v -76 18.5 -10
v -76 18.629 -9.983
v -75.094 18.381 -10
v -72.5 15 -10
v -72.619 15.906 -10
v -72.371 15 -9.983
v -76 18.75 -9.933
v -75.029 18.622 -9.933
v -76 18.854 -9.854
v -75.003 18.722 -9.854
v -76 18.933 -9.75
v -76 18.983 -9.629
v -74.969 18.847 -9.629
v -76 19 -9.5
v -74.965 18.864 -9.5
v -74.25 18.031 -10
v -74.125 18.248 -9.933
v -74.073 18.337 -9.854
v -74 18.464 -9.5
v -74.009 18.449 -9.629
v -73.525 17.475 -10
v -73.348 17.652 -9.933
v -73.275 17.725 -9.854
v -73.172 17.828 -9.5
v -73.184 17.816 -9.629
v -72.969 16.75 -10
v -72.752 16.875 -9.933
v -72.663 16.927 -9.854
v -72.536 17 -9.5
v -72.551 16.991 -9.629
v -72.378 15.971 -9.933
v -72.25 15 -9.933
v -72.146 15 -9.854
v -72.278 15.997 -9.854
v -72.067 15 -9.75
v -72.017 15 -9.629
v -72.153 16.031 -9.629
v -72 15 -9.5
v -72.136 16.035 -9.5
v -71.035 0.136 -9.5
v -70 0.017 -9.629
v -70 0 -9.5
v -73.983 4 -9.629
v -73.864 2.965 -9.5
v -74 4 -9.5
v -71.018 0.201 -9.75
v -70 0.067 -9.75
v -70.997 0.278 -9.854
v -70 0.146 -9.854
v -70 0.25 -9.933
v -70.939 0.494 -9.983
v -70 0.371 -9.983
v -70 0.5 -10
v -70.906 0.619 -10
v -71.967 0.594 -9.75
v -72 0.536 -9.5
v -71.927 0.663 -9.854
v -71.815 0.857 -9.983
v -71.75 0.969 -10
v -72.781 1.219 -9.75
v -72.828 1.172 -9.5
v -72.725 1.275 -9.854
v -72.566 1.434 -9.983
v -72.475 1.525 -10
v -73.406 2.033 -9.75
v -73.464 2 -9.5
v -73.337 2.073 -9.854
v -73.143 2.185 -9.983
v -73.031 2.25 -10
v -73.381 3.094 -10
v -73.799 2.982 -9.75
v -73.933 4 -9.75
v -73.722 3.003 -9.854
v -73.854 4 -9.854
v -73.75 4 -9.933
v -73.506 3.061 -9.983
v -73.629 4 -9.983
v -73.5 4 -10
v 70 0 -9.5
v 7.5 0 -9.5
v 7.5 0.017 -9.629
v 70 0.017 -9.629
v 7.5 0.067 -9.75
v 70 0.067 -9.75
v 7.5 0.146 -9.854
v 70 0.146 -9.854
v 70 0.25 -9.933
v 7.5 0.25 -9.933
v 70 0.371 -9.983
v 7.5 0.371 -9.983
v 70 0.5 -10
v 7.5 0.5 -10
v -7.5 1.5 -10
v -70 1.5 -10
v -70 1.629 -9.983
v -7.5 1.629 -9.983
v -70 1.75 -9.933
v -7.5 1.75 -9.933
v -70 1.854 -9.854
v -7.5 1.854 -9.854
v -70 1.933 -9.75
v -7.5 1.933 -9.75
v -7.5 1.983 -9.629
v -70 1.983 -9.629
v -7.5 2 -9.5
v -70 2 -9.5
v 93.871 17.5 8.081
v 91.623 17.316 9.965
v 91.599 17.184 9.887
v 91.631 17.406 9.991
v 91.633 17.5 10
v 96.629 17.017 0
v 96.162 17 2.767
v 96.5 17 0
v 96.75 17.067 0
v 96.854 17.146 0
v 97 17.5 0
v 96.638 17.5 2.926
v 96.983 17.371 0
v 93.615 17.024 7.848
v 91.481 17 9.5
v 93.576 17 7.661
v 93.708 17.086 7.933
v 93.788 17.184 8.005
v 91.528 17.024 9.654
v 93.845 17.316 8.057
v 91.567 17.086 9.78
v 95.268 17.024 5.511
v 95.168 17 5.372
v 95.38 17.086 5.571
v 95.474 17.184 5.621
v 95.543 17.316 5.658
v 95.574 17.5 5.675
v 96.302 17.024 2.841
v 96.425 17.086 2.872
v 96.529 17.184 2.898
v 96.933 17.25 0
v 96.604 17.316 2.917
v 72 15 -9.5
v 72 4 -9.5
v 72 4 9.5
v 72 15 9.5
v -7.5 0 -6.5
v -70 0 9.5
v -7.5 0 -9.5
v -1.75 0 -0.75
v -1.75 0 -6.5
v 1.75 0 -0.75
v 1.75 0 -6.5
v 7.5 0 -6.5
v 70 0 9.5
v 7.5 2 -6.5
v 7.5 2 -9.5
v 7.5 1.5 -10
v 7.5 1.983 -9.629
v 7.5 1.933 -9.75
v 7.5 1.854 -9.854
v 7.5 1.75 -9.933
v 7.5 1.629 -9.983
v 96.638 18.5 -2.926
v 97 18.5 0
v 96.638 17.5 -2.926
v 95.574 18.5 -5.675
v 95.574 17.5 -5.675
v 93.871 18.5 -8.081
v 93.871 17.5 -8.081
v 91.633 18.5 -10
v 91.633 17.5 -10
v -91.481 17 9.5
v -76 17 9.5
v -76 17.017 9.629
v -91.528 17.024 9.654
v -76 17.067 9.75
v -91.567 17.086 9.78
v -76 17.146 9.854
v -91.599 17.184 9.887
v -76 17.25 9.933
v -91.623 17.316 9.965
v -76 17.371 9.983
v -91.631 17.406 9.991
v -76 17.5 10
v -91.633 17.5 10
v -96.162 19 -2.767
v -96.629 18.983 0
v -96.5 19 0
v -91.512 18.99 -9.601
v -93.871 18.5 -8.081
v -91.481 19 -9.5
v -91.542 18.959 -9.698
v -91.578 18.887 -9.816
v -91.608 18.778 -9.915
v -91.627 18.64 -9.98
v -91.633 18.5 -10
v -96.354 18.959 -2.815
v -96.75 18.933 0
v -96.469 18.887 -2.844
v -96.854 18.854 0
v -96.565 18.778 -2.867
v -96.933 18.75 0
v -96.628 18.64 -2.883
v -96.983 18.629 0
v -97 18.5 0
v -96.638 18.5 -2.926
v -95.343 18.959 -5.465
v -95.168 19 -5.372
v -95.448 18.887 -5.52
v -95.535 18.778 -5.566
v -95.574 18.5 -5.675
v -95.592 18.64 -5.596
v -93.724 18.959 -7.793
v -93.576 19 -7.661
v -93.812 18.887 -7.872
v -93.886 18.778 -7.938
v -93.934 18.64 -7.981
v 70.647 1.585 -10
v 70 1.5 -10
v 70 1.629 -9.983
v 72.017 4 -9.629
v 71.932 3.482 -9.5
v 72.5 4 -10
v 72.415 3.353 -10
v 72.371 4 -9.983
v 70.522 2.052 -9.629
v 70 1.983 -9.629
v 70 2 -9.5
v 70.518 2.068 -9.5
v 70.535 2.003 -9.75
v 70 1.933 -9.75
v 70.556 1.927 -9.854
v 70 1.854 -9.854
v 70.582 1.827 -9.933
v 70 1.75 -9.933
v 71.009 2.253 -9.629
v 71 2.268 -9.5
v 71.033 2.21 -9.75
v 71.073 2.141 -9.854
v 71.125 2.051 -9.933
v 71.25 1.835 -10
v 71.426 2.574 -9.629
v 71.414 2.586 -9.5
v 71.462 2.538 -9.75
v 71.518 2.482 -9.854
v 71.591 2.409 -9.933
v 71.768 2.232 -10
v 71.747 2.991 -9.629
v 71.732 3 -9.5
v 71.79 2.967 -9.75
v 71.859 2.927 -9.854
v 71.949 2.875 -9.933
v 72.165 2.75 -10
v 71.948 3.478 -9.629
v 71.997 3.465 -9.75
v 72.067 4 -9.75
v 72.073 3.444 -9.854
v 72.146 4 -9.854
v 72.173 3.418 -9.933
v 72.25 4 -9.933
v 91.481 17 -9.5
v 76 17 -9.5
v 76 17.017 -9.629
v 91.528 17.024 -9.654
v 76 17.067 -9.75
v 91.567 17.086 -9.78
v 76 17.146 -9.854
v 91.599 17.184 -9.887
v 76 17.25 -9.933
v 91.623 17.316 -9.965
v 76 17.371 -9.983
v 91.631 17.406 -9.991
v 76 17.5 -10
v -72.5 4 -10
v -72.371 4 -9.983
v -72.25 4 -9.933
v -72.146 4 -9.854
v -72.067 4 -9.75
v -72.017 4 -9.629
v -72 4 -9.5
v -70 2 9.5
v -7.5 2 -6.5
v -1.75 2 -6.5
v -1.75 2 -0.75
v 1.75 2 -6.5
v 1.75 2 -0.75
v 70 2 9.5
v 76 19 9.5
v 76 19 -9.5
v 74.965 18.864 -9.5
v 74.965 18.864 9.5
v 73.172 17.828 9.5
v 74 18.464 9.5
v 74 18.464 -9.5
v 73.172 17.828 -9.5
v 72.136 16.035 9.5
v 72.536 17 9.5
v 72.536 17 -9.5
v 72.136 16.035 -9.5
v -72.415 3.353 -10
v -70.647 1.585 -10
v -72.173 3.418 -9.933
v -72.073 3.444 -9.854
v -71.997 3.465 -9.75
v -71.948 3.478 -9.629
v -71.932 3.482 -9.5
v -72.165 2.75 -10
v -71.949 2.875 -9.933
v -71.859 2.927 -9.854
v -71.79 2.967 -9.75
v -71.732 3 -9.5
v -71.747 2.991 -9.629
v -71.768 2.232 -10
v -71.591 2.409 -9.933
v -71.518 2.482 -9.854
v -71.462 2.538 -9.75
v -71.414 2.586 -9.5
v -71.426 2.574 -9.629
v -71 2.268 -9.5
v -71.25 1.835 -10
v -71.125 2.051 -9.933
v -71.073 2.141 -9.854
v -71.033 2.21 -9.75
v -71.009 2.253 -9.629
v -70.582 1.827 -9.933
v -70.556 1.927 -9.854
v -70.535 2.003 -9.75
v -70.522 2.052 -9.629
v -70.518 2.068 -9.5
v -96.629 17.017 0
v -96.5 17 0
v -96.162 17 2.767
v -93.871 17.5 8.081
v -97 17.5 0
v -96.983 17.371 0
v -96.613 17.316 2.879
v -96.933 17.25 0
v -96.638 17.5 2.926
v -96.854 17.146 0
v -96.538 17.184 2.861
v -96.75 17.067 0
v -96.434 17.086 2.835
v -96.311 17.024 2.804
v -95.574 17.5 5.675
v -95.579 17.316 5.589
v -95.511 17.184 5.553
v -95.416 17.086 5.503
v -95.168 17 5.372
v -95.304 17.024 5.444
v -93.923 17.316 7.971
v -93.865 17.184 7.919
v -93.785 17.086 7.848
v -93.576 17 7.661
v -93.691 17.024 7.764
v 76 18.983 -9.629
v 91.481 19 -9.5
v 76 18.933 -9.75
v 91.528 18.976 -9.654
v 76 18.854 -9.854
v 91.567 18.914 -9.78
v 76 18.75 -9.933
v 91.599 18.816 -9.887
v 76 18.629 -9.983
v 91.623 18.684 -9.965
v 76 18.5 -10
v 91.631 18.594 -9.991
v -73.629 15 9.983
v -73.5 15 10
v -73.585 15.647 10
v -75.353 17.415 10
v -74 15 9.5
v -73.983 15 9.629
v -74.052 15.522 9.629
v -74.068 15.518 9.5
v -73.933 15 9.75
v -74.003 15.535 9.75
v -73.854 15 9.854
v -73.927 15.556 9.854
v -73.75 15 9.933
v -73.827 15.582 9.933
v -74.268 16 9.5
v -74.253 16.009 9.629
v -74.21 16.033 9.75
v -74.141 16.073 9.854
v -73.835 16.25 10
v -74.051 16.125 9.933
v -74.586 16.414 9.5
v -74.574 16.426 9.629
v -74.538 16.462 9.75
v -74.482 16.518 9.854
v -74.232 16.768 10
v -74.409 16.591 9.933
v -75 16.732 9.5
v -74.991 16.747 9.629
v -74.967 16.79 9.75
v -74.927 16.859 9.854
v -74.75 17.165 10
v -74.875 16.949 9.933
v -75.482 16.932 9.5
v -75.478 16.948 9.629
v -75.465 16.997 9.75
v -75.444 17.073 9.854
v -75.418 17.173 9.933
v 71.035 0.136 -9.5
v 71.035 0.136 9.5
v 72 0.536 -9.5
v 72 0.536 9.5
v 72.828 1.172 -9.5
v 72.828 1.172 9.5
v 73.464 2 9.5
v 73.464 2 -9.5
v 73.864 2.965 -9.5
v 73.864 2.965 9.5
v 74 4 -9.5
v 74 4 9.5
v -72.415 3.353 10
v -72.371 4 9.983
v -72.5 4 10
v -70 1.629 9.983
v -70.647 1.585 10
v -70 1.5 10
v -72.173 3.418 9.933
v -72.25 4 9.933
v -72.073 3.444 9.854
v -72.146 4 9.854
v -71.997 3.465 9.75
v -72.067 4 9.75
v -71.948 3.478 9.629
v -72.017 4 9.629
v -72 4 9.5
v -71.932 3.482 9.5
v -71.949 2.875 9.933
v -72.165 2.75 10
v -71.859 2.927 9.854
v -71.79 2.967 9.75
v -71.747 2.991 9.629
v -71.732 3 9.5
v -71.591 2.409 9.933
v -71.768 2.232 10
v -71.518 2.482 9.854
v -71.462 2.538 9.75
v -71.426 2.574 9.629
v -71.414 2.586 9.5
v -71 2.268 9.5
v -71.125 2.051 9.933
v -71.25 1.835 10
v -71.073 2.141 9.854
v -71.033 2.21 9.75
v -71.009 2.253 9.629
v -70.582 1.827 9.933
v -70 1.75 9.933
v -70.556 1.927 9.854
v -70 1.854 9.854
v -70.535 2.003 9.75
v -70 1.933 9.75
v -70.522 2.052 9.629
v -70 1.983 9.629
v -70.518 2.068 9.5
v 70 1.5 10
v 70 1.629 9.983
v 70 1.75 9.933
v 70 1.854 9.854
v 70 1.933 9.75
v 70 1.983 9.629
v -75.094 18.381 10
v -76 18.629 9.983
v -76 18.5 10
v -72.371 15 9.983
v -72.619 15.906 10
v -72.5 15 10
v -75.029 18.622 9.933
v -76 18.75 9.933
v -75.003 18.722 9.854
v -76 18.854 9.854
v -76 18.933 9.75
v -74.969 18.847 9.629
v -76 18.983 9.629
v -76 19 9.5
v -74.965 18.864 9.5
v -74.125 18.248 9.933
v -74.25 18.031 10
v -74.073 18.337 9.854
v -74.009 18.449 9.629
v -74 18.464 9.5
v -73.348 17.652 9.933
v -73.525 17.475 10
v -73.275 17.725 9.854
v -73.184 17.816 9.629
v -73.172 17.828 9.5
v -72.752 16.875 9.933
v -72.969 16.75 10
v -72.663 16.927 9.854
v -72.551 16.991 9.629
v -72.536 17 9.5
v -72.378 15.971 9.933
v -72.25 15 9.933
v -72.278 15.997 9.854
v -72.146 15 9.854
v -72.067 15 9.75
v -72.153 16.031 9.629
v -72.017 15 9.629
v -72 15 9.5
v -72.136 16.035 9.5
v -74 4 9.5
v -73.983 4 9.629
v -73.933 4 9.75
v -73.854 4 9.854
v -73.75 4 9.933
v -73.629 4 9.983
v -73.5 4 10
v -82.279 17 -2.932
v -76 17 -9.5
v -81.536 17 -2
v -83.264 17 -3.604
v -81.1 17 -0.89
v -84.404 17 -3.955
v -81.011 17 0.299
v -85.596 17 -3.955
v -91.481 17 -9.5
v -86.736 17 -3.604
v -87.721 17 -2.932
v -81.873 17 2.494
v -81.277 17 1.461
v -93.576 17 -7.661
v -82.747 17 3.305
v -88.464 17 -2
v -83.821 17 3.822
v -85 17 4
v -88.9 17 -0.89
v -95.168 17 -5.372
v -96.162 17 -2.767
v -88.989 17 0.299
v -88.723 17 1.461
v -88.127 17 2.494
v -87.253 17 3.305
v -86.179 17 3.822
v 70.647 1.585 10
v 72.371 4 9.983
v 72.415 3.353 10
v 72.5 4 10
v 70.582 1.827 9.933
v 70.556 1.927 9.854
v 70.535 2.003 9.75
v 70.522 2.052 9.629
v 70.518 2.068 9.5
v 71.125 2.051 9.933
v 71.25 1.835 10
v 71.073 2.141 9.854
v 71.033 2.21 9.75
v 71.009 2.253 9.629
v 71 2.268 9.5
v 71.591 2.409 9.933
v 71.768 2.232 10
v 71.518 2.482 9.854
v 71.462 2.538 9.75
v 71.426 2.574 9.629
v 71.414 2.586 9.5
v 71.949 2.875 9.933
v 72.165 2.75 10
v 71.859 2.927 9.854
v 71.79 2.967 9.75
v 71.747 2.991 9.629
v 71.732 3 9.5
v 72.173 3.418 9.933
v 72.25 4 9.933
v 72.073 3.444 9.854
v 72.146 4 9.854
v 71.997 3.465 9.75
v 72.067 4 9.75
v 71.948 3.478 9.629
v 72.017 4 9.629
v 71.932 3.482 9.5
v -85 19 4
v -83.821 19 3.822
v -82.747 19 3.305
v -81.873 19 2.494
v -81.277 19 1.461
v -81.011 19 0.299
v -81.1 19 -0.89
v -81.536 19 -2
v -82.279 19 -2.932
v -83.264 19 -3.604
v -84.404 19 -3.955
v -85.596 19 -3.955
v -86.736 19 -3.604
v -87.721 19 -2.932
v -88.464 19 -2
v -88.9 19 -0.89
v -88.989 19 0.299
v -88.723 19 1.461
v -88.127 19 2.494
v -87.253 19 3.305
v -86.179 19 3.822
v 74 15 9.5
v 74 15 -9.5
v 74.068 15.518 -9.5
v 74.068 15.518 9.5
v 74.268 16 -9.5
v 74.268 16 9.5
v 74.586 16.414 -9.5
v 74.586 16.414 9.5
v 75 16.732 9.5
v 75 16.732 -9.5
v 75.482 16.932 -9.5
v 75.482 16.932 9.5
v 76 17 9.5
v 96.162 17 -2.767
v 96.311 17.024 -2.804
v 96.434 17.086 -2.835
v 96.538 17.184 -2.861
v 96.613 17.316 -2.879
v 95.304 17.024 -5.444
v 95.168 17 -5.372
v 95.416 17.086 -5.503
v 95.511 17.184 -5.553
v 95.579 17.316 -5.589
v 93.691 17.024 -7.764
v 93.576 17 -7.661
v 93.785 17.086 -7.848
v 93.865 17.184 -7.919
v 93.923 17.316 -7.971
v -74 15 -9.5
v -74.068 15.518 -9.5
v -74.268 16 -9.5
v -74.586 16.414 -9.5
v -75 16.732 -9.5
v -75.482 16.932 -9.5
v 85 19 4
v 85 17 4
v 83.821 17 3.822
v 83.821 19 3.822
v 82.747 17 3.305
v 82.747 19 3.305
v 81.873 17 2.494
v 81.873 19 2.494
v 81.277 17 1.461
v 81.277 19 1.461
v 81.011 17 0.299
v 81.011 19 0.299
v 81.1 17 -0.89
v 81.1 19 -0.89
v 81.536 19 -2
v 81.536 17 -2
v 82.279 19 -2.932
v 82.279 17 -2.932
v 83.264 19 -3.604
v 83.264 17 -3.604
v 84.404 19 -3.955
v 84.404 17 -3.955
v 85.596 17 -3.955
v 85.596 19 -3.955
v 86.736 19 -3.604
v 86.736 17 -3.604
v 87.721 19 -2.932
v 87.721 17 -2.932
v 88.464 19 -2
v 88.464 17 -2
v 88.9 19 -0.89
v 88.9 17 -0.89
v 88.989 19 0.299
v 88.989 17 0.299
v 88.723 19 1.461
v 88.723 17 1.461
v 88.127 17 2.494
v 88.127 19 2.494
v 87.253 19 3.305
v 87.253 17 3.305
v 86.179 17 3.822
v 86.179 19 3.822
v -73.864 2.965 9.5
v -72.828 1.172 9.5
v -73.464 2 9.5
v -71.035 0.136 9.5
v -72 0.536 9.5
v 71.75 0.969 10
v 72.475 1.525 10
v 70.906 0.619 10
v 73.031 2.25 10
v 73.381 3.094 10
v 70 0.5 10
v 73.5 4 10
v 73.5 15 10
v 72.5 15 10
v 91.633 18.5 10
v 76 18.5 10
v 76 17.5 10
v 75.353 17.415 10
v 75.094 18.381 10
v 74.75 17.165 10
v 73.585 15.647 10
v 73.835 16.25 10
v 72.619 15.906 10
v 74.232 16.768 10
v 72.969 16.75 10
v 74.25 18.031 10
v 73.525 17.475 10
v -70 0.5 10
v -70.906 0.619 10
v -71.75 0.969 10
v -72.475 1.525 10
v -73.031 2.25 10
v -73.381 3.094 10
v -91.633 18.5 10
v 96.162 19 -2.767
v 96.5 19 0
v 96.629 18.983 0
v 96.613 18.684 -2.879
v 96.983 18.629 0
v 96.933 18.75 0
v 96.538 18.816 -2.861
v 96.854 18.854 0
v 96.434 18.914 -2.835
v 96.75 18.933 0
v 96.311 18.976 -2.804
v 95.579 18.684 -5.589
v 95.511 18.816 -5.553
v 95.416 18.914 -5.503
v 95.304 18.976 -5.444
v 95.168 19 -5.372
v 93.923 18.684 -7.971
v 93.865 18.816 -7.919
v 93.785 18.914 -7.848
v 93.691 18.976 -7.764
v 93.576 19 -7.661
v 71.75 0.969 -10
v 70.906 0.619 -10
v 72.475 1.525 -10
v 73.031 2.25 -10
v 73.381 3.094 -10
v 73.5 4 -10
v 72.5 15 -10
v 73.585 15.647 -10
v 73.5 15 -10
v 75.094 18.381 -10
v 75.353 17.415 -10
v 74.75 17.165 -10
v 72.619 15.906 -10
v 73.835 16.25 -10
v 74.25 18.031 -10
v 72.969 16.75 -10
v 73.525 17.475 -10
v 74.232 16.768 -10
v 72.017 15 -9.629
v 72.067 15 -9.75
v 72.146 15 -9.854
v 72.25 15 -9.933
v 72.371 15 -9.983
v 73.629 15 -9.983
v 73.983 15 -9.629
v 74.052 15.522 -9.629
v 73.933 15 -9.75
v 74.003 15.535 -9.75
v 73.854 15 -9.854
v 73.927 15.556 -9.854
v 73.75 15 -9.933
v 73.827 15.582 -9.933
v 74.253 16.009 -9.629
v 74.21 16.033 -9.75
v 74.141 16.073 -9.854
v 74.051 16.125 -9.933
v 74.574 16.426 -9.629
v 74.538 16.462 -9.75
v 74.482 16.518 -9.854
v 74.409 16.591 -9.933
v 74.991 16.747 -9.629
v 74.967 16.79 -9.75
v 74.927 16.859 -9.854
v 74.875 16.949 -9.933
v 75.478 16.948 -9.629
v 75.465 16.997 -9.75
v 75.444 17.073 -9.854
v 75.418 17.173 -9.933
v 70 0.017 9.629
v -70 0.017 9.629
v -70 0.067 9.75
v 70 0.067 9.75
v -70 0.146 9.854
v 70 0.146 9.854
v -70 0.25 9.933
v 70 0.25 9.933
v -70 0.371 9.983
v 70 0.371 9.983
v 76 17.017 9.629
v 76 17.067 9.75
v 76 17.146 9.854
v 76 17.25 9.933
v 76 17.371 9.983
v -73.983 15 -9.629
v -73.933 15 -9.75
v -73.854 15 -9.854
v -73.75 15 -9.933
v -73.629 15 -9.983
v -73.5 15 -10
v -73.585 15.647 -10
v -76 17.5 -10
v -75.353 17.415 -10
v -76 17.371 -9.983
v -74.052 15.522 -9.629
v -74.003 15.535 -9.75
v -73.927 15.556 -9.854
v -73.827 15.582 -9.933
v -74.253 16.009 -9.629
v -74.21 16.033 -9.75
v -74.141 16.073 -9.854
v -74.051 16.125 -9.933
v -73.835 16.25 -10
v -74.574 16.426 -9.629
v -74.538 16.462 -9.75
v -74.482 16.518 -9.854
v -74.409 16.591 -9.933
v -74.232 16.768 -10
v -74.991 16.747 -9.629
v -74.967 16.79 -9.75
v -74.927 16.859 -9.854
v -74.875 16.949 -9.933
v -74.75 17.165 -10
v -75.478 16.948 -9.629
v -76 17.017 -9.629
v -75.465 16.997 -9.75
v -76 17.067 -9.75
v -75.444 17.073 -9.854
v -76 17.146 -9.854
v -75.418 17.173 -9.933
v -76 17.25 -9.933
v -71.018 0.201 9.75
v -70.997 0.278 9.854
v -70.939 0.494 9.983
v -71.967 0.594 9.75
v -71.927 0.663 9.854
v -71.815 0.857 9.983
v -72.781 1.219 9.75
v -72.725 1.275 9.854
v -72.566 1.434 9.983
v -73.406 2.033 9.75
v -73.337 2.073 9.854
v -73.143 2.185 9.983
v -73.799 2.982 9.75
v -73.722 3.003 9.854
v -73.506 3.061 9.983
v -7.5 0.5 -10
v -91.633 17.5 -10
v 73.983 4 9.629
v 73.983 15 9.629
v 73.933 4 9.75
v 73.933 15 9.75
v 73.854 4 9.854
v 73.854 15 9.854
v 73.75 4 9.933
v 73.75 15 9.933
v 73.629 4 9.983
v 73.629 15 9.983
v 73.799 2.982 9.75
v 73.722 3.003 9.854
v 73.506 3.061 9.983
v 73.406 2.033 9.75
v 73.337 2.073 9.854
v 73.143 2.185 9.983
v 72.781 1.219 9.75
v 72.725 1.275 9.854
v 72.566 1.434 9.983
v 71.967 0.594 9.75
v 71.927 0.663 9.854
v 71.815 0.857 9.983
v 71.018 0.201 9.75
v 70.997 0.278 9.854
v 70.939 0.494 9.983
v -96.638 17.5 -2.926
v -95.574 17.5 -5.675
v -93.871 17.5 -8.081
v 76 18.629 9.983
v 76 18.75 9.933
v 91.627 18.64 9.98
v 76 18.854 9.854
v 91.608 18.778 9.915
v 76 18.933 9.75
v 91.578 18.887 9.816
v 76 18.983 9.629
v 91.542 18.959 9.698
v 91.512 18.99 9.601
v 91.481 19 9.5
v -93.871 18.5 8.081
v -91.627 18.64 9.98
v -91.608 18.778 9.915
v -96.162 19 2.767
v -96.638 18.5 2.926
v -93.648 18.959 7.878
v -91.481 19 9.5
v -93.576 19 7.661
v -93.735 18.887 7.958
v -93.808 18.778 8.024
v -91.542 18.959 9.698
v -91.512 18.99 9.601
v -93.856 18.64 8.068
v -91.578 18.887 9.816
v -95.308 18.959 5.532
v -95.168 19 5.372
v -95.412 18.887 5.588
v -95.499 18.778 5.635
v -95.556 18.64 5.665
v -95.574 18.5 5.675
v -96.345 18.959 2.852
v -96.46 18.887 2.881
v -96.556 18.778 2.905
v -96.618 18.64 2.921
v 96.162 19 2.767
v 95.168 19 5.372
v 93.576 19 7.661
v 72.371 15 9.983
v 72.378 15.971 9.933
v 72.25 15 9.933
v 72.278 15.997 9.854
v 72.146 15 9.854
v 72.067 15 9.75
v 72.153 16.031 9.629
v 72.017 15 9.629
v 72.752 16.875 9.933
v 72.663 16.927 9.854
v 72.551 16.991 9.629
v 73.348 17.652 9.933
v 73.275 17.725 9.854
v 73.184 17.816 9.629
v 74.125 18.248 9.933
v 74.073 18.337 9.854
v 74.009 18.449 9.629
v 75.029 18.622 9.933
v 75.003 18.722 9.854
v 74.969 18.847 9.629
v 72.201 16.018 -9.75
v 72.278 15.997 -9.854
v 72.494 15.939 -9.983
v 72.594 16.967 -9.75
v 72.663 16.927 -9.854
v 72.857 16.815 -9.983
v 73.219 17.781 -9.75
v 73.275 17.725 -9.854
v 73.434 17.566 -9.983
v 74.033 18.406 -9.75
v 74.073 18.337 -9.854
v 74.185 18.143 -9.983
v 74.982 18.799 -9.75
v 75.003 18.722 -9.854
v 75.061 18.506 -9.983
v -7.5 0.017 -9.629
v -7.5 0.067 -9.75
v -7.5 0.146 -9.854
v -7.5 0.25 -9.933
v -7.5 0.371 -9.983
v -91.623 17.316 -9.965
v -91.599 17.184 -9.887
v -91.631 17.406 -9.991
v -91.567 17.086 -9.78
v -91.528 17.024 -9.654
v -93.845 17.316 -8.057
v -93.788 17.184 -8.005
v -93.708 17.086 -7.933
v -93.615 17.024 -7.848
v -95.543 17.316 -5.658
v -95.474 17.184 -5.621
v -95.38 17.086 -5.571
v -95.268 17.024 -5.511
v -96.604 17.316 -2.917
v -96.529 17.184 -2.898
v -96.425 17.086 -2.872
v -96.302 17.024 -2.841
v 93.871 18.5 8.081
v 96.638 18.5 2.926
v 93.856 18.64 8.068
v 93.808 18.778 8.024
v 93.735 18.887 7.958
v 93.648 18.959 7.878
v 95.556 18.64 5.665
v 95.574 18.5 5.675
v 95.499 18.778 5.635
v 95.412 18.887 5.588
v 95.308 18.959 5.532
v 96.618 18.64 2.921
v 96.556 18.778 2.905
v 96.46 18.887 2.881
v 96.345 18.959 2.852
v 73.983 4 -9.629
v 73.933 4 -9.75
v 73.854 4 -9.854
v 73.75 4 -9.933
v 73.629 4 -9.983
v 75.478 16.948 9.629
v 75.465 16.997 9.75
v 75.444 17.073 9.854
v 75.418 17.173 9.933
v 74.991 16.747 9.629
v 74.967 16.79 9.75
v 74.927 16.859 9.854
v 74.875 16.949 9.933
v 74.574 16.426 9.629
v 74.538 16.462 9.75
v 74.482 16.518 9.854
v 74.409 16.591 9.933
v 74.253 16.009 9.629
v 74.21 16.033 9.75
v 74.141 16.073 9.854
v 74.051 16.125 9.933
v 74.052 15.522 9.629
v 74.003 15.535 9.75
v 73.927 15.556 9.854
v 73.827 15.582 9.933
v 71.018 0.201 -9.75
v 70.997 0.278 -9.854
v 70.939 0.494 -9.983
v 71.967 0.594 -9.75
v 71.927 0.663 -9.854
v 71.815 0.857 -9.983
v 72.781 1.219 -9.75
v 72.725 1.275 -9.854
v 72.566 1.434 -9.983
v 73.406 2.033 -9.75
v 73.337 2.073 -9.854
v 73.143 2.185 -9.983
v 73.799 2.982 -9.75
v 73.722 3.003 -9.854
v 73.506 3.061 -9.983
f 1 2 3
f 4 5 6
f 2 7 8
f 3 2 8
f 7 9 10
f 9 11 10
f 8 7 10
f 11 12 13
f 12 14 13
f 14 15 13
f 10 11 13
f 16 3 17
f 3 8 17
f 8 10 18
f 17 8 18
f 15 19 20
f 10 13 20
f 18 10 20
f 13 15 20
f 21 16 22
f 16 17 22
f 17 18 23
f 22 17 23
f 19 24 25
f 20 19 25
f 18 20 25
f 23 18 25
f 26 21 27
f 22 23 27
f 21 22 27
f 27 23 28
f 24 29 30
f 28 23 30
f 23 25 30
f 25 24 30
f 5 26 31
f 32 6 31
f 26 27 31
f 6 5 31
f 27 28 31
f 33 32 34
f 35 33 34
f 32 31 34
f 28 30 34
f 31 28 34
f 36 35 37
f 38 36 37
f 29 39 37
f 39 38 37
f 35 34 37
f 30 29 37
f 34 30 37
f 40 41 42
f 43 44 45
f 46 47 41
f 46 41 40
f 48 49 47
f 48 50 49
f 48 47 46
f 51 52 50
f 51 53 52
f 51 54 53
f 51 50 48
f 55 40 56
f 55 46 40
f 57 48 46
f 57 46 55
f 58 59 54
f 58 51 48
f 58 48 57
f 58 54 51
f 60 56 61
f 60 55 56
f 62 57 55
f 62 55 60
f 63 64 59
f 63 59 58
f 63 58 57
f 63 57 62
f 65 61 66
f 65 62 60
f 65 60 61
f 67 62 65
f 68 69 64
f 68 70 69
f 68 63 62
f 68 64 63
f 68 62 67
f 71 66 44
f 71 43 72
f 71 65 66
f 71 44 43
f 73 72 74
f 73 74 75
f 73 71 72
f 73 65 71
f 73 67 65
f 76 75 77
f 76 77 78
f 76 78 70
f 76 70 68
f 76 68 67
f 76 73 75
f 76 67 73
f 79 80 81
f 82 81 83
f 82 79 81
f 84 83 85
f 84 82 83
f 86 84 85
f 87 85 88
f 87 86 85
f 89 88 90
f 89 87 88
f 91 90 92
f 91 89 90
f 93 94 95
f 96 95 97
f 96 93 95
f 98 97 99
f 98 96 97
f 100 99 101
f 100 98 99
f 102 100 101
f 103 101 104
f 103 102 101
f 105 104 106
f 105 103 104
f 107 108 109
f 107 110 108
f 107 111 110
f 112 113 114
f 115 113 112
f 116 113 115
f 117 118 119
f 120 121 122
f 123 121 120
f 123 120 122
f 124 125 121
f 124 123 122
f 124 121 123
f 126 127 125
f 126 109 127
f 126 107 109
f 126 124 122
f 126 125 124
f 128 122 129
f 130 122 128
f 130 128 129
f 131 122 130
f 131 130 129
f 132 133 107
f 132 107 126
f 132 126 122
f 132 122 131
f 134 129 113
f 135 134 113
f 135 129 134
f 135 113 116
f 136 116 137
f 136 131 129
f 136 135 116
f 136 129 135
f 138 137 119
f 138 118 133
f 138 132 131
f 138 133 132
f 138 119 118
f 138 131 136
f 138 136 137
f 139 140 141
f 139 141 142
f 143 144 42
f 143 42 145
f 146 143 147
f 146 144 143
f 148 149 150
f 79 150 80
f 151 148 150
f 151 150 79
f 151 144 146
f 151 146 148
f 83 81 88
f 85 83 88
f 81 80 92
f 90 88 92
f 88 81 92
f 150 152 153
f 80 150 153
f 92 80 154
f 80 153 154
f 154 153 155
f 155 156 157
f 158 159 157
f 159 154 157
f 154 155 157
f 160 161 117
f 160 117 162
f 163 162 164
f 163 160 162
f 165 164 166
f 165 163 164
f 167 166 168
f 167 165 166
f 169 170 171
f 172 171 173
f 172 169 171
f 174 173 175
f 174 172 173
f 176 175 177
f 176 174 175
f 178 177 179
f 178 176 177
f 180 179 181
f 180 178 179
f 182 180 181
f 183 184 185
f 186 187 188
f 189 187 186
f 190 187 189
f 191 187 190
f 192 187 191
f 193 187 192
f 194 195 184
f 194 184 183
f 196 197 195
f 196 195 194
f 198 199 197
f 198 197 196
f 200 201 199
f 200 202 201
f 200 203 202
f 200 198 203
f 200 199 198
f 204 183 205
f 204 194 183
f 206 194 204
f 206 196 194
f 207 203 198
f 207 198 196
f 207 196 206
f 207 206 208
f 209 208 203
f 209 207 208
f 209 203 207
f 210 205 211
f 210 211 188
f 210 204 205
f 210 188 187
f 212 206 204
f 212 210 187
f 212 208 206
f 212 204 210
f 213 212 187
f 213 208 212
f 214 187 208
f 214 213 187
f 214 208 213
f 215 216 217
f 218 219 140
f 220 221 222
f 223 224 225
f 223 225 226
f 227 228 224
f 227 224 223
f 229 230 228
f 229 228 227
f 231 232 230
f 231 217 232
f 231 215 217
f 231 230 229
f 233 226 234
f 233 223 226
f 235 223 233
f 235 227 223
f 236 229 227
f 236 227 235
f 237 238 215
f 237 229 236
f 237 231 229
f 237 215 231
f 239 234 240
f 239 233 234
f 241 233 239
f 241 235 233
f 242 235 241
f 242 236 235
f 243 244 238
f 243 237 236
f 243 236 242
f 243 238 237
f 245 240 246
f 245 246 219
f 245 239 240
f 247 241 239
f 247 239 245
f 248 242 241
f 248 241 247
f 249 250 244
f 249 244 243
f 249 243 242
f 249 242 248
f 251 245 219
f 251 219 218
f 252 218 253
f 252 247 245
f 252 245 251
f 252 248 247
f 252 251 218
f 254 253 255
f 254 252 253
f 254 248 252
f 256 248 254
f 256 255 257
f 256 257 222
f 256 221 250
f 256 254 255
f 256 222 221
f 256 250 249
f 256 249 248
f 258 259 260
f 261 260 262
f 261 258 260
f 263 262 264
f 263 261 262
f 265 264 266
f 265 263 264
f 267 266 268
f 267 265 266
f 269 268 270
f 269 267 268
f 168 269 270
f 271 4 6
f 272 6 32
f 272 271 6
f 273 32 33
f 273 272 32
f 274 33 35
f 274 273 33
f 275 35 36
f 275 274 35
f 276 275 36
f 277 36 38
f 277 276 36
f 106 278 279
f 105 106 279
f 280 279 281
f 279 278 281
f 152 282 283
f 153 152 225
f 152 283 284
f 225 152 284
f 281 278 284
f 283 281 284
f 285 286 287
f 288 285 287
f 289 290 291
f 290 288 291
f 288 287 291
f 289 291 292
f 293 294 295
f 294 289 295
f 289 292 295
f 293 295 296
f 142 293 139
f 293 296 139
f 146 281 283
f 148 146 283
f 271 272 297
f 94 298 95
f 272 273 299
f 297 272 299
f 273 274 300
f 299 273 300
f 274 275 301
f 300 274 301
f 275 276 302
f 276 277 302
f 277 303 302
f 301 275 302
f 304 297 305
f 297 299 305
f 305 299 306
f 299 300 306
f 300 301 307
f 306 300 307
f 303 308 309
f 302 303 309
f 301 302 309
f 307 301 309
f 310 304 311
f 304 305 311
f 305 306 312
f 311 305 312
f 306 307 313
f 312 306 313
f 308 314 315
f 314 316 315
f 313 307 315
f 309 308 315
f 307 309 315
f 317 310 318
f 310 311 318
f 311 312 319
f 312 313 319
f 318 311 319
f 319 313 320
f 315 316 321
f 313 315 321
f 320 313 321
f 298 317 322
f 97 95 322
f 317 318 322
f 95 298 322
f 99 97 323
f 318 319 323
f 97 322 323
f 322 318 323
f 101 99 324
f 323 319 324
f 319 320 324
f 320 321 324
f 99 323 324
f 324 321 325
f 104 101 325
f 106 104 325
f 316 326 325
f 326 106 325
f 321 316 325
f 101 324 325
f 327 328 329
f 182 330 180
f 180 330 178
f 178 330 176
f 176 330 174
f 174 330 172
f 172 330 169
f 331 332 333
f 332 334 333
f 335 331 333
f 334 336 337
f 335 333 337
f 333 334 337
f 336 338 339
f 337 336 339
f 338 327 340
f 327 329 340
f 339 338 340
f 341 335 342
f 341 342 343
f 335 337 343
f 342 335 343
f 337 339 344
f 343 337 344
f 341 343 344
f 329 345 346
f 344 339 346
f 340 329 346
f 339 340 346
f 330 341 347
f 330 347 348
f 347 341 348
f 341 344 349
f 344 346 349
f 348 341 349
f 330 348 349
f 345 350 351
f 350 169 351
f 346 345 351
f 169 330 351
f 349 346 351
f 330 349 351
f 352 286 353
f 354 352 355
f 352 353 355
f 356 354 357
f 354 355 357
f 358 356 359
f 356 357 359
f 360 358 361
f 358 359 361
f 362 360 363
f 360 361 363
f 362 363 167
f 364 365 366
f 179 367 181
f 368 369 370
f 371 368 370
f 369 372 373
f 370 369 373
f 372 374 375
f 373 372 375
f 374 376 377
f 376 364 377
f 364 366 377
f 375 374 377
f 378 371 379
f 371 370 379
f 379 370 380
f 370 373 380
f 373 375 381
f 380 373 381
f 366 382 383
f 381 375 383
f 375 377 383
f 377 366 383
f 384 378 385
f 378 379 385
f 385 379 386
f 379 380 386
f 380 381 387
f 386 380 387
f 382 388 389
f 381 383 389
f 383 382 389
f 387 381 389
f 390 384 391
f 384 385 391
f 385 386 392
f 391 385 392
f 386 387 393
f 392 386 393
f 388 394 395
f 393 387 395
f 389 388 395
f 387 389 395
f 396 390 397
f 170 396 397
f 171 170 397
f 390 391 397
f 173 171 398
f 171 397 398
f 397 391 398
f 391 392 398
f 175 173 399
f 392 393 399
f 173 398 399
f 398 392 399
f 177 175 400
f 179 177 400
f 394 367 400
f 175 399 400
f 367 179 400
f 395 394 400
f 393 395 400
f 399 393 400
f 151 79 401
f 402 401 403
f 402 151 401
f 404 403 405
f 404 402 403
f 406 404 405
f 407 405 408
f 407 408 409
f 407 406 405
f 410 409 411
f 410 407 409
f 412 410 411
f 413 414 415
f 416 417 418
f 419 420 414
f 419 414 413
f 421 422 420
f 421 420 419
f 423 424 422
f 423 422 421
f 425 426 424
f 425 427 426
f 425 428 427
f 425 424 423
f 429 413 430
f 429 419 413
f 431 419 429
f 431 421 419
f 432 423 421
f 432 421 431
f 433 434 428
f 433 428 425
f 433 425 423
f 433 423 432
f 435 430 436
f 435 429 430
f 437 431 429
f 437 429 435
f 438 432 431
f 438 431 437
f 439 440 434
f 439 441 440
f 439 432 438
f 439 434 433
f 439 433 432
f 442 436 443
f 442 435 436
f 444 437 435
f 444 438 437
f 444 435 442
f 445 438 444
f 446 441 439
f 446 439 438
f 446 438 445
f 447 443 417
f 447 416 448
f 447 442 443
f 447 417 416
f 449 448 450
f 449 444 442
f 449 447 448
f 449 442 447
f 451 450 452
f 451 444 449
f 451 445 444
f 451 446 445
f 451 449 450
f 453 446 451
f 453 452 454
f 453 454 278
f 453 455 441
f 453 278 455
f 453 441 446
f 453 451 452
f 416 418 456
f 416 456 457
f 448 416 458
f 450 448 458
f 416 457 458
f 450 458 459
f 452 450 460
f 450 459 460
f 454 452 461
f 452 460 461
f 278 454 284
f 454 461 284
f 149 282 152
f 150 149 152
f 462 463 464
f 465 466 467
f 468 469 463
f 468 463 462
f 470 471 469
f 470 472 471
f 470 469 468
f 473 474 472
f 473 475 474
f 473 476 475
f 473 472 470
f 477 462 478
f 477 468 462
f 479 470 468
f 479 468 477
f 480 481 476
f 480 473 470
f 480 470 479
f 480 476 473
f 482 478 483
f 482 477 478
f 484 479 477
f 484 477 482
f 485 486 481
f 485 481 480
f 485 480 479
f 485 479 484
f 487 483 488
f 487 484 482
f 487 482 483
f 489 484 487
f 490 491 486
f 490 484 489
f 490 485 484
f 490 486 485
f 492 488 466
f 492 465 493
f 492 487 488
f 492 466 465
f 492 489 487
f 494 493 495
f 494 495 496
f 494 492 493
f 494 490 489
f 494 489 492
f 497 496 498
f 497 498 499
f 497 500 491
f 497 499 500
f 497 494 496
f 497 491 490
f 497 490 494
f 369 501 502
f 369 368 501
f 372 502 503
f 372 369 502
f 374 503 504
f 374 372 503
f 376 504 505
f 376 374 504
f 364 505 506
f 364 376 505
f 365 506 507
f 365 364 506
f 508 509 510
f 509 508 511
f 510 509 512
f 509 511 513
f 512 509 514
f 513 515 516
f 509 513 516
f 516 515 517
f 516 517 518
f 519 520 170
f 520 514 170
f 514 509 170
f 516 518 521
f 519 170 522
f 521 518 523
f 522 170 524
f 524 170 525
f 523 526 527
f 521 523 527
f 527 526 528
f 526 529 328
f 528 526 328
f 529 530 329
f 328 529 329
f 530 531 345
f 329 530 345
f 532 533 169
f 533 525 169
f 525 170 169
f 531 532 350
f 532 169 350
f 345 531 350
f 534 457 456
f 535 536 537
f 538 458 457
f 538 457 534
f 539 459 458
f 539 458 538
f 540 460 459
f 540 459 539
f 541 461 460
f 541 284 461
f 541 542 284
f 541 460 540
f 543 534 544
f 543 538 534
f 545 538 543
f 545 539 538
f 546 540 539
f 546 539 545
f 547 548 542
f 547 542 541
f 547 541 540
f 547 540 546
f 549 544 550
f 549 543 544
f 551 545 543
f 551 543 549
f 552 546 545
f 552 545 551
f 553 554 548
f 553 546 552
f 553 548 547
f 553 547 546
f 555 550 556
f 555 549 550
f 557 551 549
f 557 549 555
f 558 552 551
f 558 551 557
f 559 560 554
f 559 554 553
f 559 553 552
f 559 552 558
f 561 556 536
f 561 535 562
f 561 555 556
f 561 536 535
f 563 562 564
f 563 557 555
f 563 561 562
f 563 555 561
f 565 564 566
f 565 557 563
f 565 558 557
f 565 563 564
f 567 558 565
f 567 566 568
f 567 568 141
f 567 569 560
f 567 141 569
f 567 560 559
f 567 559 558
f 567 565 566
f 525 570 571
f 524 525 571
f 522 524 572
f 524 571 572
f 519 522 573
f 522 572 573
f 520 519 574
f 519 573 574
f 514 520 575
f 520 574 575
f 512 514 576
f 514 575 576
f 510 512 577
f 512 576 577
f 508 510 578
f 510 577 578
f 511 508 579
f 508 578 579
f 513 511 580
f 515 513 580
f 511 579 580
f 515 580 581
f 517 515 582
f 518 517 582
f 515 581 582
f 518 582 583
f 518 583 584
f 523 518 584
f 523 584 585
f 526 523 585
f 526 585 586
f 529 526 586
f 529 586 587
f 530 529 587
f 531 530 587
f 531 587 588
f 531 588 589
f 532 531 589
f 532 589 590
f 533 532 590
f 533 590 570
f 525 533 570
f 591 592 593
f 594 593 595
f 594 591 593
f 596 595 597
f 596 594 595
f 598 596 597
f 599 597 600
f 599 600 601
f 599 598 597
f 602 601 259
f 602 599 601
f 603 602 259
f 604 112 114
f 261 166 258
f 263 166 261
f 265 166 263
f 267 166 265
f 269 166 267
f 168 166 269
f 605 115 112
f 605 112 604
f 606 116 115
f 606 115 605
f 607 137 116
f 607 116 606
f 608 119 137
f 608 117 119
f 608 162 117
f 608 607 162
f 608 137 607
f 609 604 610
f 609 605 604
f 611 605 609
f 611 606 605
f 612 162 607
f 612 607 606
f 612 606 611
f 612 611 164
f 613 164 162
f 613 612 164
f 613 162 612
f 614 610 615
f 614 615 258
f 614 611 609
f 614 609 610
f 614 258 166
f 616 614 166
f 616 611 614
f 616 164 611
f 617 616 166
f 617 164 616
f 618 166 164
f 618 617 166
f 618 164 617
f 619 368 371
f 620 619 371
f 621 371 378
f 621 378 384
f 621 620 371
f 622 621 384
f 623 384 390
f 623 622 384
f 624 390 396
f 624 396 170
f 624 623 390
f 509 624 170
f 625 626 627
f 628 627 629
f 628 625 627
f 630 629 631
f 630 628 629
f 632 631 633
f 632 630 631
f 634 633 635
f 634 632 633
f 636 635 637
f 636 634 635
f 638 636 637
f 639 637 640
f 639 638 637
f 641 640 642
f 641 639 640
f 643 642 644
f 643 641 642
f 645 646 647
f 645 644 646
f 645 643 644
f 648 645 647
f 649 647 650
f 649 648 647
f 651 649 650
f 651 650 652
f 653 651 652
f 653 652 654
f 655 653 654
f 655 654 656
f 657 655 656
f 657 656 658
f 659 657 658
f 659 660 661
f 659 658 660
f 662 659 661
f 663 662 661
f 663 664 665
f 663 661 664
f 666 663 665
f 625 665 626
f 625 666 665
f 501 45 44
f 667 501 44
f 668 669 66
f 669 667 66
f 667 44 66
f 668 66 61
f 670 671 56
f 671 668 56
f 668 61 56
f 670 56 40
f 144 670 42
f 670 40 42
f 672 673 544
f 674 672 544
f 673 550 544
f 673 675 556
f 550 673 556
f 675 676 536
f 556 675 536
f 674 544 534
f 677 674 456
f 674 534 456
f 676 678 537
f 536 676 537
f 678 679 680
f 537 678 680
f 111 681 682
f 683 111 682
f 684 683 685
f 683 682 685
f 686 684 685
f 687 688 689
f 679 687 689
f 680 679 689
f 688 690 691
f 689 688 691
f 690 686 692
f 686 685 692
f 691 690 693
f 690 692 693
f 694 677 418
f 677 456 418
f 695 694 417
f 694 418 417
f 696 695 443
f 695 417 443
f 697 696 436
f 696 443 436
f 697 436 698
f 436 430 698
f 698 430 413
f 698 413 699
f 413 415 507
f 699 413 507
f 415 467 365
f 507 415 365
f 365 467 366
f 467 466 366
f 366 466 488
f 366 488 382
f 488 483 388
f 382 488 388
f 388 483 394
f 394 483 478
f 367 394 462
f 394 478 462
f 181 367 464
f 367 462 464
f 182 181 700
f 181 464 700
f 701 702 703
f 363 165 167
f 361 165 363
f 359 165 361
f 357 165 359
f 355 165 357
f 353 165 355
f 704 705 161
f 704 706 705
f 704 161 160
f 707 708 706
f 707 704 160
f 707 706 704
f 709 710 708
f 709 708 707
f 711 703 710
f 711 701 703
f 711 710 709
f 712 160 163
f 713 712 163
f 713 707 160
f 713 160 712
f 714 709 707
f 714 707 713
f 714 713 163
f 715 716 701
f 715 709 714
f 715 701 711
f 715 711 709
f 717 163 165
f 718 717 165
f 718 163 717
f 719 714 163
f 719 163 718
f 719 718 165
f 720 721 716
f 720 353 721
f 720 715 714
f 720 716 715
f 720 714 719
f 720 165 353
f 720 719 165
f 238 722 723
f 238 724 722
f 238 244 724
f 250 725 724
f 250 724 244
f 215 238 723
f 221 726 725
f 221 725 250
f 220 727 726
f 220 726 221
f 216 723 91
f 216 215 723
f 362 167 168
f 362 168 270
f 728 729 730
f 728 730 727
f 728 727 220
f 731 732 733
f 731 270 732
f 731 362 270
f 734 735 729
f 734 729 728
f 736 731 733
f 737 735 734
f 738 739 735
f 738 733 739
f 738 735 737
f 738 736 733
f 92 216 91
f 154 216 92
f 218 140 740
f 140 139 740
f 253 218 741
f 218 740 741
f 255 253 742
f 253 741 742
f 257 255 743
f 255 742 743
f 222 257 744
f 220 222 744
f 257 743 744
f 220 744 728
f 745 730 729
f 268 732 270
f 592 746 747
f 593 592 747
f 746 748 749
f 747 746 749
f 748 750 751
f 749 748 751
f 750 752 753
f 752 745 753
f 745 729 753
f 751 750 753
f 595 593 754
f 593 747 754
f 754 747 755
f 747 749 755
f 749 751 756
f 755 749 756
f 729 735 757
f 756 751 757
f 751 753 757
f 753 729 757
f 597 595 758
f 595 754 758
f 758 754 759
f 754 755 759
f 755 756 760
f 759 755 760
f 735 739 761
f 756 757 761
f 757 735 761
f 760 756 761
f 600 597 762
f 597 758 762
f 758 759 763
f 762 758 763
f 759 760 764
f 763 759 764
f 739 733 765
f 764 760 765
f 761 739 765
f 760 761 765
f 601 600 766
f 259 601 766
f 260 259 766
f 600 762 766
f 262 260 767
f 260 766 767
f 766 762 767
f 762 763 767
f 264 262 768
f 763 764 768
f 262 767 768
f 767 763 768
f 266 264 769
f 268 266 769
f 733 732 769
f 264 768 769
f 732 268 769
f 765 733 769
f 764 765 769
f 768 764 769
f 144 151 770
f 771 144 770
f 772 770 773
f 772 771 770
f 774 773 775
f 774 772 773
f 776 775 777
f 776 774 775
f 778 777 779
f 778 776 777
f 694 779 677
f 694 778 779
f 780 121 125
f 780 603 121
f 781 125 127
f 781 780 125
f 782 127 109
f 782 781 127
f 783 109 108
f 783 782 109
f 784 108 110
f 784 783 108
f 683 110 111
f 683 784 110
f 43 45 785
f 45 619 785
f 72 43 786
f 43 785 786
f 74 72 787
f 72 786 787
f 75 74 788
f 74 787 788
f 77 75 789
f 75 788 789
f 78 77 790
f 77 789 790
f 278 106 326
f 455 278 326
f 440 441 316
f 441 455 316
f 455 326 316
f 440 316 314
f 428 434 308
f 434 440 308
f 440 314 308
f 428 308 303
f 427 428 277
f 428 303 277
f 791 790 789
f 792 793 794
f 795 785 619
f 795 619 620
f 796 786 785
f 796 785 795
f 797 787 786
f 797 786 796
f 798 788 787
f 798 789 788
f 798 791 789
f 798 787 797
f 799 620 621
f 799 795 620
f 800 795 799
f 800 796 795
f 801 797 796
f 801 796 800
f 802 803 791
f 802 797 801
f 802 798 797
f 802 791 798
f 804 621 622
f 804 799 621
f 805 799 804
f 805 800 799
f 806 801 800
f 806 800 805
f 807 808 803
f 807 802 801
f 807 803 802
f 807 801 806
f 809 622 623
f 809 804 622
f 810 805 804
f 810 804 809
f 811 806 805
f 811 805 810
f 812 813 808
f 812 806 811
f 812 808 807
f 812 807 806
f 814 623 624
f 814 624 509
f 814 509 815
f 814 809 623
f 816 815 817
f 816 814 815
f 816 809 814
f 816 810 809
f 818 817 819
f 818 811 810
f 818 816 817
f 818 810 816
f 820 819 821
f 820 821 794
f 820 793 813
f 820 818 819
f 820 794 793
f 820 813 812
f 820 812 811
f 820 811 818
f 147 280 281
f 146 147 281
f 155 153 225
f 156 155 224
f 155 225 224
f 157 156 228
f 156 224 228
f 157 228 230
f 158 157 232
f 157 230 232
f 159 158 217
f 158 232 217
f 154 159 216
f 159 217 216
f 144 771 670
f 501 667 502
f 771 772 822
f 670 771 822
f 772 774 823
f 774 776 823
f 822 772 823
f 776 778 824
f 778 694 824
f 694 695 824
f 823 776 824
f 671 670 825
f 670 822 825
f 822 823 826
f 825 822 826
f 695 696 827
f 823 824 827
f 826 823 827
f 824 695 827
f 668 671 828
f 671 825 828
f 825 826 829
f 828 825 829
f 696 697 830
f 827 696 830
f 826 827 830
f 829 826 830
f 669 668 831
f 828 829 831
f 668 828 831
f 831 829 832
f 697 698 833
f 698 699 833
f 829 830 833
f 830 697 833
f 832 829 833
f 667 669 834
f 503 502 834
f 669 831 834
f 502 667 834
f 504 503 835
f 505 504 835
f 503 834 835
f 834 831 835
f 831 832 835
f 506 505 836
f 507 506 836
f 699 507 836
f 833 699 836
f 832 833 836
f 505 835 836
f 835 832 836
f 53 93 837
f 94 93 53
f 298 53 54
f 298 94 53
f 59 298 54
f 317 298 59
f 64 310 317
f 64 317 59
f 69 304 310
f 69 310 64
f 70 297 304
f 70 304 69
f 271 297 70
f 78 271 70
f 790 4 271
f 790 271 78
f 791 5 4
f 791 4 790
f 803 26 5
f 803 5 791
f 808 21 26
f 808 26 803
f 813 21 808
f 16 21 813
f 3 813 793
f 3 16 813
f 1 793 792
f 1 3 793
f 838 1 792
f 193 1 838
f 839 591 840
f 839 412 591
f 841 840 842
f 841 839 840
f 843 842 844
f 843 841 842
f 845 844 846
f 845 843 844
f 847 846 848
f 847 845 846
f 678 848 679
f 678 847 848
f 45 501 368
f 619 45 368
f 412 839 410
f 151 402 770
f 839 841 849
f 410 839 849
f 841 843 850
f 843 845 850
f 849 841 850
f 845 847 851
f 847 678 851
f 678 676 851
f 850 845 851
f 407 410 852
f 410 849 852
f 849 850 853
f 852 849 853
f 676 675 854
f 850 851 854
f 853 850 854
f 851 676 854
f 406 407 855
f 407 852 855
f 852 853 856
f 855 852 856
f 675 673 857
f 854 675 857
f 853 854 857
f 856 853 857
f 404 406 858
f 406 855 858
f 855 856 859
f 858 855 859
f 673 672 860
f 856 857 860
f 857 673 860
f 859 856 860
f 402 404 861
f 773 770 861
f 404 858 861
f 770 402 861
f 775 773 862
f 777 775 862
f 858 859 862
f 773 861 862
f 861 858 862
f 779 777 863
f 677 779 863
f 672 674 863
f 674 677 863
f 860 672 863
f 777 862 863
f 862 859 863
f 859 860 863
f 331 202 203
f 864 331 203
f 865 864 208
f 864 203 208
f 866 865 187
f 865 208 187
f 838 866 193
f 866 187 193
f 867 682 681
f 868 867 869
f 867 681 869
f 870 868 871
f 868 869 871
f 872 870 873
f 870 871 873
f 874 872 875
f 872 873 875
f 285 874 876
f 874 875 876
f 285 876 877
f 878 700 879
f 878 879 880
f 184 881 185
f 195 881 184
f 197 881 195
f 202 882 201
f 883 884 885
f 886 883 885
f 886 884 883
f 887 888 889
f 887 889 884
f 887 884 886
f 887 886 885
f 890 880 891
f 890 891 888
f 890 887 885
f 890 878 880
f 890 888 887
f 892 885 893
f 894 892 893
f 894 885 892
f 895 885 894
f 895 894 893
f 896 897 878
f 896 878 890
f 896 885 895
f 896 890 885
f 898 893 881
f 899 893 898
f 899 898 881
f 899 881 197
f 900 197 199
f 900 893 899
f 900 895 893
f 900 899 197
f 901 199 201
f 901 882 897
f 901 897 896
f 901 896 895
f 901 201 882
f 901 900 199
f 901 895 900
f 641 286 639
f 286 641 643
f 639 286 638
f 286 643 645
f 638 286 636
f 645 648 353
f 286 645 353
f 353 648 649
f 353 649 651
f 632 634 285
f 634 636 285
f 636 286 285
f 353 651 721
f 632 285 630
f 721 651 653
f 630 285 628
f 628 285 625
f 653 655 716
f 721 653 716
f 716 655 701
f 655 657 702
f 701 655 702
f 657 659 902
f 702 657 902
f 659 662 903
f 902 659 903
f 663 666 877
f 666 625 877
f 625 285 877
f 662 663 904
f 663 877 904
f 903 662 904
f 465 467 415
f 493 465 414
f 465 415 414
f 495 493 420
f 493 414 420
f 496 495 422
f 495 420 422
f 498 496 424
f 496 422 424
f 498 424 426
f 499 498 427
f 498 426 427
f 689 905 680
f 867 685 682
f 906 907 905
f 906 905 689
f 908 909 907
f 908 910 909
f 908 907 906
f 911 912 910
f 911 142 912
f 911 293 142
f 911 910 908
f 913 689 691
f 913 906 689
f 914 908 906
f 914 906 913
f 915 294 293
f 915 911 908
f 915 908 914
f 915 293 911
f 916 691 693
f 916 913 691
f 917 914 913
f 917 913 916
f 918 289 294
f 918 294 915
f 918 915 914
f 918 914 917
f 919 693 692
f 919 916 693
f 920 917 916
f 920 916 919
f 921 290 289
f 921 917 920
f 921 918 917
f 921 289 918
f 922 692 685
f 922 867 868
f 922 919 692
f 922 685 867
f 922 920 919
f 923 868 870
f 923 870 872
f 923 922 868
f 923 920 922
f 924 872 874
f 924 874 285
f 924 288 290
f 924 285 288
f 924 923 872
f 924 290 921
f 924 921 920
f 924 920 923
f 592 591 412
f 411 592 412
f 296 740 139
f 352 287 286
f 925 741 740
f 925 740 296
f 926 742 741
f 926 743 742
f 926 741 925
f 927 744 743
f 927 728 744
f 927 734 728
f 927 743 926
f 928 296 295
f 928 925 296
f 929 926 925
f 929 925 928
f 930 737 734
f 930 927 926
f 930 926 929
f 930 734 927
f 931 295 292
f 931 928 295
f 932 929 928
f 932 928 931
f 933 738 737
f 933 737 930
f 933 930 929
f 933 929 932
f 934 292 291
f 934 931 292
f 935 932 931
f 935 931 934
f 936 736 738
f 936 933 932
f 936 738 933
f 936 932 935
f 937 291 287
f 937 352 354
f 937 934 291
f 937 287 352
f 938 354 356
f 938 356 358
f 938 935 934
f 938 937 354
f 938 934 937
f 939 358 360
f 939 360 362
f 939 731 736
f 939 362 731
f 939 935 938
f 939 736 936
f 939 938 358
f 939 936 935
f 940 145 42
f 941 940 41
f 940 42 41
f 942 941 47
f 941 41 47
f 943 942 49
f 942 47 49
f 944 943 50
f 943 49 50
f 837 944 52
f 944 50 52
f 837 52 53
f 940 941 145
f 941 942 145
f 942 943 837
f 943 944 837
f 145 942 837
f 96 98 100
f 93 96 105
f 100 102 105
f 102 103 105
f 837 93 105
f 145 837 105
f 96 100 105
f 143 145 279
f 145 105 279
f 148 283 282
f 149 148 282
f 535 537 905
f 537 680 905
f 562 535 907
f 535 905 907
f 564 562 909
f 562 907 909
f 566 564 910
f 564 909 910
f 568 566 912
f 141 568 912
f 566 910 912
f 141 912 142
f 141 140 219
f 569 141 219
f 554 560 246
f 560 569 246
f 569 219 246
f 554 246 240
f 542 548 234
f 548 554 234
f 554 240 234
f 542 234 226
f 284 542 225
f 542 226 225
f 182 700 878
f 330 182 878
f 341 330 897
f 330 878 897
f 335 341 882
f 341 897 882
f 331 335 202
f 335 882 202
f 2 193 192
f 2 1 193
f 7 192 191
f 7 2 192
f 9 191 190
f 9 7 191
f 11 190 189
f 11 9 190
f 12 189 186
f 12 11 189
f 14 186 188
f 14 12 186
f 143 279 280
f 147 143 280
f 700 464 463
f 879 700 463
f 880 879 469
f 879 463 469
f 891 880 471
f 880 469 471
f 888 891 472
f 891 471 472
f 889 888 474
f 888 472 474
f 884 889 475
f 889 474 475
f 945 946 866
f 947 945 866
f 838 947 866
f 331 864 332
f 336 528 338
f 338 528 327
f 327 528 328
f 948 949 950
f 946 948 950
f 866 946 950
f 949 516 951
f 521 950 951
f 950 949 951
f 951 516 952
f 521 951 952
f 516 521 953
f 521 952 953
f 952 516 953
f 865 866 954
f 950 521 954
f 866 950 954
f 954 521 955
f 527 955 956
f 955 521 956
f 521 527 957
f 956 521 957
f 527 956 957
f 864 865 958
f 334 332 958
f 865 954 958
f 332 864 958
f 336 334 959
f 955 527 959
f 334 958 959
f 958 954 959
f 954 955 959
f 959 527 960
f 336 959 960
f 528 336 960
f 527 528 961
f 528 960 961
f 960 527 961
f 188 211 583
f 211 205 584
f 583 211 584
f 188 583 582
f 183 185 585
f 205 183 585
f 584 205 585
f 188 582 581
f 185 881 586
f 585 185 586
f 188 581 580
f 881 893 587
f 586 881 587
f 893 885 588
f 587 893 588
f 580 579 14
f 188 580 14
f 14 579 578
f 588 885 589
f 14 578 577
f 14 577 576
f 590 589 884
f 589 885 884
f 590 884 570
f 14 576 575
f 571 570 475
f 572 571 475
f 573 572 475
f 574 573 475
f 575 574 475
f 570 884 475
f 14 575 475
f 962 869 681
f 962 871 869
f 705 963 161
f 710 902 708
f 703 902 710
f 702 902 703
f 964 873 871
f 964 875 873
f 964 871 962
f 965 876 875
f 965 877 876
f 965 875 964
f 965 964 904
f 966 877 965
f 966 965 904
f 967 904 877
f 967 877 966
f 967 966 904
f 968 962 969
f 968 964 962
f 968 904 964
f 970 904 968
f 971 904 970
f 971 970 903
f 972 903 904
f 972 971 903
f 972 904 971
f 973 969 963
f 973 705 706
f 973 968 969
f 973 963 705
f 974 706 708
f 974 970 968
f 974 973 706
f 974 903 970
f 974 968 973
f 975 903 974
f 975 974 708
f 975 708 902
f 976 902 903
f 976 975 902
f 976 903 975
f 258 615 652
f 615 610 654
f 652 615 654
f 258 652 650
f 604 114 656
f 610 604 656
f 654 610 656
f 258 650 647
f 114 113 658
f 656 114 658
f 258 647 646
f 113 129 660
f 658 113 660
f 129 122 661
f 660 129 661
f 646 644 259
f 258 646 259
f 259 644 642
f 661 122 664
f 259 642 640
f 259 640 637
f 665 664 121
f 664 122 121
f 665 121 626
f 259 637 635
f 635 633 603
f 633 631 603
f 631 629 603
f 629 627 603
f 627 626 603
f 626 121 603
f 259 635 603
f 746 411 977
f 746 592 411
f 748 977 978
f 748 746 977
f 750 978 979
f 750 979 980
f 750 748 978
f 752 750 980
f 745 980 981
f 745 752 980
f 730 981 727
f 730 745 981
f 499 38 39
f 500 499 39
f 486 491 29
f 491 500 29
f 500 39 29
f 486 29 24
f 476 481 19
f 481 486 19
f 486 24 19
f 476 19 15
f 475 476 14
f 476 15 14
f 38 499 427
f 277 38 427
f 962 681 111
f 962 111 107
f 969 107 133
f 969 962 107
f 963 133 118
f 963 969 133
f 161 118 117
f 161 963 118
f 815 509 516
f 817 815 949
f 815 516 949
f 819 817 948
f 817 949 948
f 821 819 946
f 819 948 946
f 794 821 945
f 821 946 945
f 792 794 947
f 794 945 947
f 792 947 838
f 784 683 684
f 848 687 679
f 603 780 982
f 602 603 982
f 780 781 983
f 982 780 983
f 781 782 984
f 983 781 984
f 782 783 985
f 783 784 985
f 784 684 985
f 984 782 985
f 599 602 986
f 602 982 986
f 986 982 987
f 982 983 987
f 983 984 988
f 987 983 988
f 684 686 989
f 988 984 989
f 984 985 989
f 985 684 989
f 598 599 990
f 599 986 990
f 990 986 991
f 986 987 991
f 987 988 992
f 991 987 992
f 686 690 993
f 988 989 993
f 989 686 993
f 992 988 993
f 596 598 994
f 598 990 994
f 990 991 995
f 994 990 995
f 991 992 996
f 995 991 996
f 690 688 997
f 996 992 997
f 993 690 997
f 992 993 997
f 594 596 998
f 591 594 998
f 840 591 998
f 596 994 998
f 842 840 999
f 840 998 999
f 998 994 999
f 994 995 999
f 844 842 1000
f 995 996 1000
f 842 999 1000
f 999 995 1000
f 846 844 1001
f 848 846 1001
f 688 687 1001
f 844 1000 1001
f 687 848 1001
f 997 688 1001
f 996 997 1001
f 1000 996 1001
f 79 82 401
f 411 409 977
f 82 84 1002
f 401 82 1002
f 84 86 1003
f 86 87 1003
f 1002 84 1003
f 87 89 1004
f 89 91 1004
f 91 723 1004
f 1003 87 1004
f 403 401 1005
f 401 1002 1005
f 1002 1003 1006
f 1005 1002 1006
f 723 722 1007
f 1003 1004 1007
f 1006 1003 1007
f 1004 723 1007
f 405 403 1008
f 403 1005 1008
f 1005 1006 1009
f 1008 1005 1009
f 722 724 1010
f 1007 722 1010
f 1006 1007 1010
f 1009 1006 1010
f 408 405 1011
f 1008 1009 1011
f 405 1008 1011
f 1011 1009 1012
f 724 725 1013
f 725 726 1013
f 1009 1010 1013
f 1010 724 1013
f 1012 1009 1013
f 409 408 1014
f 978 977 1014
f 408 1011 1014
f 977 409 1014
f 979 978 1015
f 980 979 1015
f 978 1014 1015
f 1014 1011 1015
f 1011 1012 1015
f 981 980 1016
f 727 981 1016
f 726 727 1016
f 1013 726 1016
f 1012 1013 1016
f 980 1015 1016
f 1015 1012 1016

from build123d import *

# Parameters (mm, degrees)
BOSS_EXTRUDE1_DEPTH = 10
SKETCH2_R           = 4
CUT_EXTRUDE1_DEPTH  = 100.347873656
CUT_EXTRUDE2_DEPTH  = 99.984847325
FILLET1_R           = 2
FILLET2_R           = 4
FILLET3_R           = 0.5


with BuildPart() as part:
    # Sketch1 → Boss-Extrude1 (new, symmetric)
    with BuildSketch(Plane.XY):
        Polygon((0, 0), (-74, 0), (-74, 17), (-97, 17), (-97, 19), (-72, 19), (-72, 2), (72, 2), (72, 19), (97, 19), (97, 17), (74, 17), (74, 0), align=None)
    extrude(amount=BOSS_EXTRUDE1_DEPTH, both=True)

    # Sketch2 → Cut-Extrude1 (cut, through all)
    with BuildSketch(Plane(origin=(0, 19, 0), x_dir=(1, 0, 0), z_dir=(0, 1, 0))):
        with BuildLine():
            ThreePointArc((-97, 0), (-95.573528147, 5.674548662), (-91.633249581, 10))
            Line((-91.633249581, 10), (-97, 10))
            Line((-97, 10), (-97, 0))
        make_face()
        with BuildLine():
            ThreePointArc((-91.633249581, -10), (-95.573528147, -5.674548662), (-97, 0))
            Line((-97, 0), (-97, -10))
            Line((-97, -10), (-91.633249581, -10))
        make_face()
        with Locations(Location((-85, 0, 0), (0, 0, 270))):
            Circle(SKETCH2_R)
    cut_extrude1 = extrude(amount=-CUT_EXTRUDE1_DEPTH, mode=Mode.SUBTRACT)

    # Mirror1: Cut-Extrude1 across plane
    add(cut_extrude1.mirror(Plane(origin=(0, 0, 0), x_dir=(0, 0, 1), z_dir=(1, 0, 0))), mode=Mode.SUBTRACT)

    # Sketch3 → Cut-Extrude2 (cut, through all)
    with BuildSketch(Plane(origin=(0, 2, 0), x_dir=(1, 0, 0), z_dir=(0, 1, 0))):
        Polygon((-7.5, 6.5), (-1.75, 6.5), (-1.75, 0.75), (1.75, 0.75), (1.75, 6.5), (7.5, 6.5), (7.5, 10), (-7.5, 10), align=None)
    extrude(amount=-CUT_EXTRUDE2_DEPTH, mode=Mode.SUBTRACT)

    # Fillet1
    fillet1_edges = [part.edges().sort_by_distance(p)[0] for p in [
        (-74, 17, 0),
        (-72, 2, 0),
        (72, 2, 0),
        (74, 17, 0),
    ]]
    fillet(fillet1_edges, radius=FILLET1_R)

    # Fillet2
    fillet2_edges = [part.edges().sort_by_distance(p)[0] for p in [
        (-74, 0, 0),
        (-72, 19, 0),
        (72, 19, 0),
        (74, 0, 0),
    ]]
    fillet(fillet2_edges, radius=FILLET2_R)

    # Fillet3
    fillet3_edges = [part.edges().sort_by_distance(p)[0] for p in [
        (-74, 9.5, -10),
        (-74, 9.5, 10),
        (-72, 9.5, -10),
        (-73.171572875, 17.828427125, -10),
        (-71.414213562, 2.585786438, -10),
        (-83.81662479, 19, -10),
        (-38.75, 2, -10),
        (-83.81662479, 17, -10),
        (-38.75, 0, -10),
        (-74.585786438, 16.414213562, -10),
        (-72.828427125, 1.171572875, -10),
        (-72.828427125, 1.171572875, 10),
        (-74.585786438, 16.414213562, 10),
        (74, 9.5, 10),
        (72.828427125, 1.171572875, 10),
        (74.585786438, 16.414213562, 10),
        (0, 0, 10),
        (83.81662479, 17, 10),
        (83.81662479, 19, 10),
        (73.171572875, 17.828427125, 10),
        (-83.81662479, 17, 10),
        (72, 9.5, 10),
        (71.414213562, 2.585786438, 10),
        (-83.81662479, 19, 10),
        (0, 2, 10),
        (-73.171572875, 17.828427125, 10),
        (-71.414213562, 2.585786438, 10),
        (-72, 9.5, 10),
        (-97, 19, 0),
        (38.75, 2, -10),
        (-97, 17, 0),
        (38.75, 0, -10),
        (74, 9.5, -10),
        (72.828427125, 1.171572875, -10),
        (74.585786438, 16.414213562, -10),
        (83.81662479, 17, -10),
        (97, 17, 0),
        (97, 19, 0),
        (83.81662479, 19, -10),
        (73.171572875, 17.828427125, -10),
        (72, 9.5, -10),
        (71.414213562, 2.585786438, -10),
    ]]
    fillet(fillet3_edges, radius=FILLET3_R)


solid = part.part
